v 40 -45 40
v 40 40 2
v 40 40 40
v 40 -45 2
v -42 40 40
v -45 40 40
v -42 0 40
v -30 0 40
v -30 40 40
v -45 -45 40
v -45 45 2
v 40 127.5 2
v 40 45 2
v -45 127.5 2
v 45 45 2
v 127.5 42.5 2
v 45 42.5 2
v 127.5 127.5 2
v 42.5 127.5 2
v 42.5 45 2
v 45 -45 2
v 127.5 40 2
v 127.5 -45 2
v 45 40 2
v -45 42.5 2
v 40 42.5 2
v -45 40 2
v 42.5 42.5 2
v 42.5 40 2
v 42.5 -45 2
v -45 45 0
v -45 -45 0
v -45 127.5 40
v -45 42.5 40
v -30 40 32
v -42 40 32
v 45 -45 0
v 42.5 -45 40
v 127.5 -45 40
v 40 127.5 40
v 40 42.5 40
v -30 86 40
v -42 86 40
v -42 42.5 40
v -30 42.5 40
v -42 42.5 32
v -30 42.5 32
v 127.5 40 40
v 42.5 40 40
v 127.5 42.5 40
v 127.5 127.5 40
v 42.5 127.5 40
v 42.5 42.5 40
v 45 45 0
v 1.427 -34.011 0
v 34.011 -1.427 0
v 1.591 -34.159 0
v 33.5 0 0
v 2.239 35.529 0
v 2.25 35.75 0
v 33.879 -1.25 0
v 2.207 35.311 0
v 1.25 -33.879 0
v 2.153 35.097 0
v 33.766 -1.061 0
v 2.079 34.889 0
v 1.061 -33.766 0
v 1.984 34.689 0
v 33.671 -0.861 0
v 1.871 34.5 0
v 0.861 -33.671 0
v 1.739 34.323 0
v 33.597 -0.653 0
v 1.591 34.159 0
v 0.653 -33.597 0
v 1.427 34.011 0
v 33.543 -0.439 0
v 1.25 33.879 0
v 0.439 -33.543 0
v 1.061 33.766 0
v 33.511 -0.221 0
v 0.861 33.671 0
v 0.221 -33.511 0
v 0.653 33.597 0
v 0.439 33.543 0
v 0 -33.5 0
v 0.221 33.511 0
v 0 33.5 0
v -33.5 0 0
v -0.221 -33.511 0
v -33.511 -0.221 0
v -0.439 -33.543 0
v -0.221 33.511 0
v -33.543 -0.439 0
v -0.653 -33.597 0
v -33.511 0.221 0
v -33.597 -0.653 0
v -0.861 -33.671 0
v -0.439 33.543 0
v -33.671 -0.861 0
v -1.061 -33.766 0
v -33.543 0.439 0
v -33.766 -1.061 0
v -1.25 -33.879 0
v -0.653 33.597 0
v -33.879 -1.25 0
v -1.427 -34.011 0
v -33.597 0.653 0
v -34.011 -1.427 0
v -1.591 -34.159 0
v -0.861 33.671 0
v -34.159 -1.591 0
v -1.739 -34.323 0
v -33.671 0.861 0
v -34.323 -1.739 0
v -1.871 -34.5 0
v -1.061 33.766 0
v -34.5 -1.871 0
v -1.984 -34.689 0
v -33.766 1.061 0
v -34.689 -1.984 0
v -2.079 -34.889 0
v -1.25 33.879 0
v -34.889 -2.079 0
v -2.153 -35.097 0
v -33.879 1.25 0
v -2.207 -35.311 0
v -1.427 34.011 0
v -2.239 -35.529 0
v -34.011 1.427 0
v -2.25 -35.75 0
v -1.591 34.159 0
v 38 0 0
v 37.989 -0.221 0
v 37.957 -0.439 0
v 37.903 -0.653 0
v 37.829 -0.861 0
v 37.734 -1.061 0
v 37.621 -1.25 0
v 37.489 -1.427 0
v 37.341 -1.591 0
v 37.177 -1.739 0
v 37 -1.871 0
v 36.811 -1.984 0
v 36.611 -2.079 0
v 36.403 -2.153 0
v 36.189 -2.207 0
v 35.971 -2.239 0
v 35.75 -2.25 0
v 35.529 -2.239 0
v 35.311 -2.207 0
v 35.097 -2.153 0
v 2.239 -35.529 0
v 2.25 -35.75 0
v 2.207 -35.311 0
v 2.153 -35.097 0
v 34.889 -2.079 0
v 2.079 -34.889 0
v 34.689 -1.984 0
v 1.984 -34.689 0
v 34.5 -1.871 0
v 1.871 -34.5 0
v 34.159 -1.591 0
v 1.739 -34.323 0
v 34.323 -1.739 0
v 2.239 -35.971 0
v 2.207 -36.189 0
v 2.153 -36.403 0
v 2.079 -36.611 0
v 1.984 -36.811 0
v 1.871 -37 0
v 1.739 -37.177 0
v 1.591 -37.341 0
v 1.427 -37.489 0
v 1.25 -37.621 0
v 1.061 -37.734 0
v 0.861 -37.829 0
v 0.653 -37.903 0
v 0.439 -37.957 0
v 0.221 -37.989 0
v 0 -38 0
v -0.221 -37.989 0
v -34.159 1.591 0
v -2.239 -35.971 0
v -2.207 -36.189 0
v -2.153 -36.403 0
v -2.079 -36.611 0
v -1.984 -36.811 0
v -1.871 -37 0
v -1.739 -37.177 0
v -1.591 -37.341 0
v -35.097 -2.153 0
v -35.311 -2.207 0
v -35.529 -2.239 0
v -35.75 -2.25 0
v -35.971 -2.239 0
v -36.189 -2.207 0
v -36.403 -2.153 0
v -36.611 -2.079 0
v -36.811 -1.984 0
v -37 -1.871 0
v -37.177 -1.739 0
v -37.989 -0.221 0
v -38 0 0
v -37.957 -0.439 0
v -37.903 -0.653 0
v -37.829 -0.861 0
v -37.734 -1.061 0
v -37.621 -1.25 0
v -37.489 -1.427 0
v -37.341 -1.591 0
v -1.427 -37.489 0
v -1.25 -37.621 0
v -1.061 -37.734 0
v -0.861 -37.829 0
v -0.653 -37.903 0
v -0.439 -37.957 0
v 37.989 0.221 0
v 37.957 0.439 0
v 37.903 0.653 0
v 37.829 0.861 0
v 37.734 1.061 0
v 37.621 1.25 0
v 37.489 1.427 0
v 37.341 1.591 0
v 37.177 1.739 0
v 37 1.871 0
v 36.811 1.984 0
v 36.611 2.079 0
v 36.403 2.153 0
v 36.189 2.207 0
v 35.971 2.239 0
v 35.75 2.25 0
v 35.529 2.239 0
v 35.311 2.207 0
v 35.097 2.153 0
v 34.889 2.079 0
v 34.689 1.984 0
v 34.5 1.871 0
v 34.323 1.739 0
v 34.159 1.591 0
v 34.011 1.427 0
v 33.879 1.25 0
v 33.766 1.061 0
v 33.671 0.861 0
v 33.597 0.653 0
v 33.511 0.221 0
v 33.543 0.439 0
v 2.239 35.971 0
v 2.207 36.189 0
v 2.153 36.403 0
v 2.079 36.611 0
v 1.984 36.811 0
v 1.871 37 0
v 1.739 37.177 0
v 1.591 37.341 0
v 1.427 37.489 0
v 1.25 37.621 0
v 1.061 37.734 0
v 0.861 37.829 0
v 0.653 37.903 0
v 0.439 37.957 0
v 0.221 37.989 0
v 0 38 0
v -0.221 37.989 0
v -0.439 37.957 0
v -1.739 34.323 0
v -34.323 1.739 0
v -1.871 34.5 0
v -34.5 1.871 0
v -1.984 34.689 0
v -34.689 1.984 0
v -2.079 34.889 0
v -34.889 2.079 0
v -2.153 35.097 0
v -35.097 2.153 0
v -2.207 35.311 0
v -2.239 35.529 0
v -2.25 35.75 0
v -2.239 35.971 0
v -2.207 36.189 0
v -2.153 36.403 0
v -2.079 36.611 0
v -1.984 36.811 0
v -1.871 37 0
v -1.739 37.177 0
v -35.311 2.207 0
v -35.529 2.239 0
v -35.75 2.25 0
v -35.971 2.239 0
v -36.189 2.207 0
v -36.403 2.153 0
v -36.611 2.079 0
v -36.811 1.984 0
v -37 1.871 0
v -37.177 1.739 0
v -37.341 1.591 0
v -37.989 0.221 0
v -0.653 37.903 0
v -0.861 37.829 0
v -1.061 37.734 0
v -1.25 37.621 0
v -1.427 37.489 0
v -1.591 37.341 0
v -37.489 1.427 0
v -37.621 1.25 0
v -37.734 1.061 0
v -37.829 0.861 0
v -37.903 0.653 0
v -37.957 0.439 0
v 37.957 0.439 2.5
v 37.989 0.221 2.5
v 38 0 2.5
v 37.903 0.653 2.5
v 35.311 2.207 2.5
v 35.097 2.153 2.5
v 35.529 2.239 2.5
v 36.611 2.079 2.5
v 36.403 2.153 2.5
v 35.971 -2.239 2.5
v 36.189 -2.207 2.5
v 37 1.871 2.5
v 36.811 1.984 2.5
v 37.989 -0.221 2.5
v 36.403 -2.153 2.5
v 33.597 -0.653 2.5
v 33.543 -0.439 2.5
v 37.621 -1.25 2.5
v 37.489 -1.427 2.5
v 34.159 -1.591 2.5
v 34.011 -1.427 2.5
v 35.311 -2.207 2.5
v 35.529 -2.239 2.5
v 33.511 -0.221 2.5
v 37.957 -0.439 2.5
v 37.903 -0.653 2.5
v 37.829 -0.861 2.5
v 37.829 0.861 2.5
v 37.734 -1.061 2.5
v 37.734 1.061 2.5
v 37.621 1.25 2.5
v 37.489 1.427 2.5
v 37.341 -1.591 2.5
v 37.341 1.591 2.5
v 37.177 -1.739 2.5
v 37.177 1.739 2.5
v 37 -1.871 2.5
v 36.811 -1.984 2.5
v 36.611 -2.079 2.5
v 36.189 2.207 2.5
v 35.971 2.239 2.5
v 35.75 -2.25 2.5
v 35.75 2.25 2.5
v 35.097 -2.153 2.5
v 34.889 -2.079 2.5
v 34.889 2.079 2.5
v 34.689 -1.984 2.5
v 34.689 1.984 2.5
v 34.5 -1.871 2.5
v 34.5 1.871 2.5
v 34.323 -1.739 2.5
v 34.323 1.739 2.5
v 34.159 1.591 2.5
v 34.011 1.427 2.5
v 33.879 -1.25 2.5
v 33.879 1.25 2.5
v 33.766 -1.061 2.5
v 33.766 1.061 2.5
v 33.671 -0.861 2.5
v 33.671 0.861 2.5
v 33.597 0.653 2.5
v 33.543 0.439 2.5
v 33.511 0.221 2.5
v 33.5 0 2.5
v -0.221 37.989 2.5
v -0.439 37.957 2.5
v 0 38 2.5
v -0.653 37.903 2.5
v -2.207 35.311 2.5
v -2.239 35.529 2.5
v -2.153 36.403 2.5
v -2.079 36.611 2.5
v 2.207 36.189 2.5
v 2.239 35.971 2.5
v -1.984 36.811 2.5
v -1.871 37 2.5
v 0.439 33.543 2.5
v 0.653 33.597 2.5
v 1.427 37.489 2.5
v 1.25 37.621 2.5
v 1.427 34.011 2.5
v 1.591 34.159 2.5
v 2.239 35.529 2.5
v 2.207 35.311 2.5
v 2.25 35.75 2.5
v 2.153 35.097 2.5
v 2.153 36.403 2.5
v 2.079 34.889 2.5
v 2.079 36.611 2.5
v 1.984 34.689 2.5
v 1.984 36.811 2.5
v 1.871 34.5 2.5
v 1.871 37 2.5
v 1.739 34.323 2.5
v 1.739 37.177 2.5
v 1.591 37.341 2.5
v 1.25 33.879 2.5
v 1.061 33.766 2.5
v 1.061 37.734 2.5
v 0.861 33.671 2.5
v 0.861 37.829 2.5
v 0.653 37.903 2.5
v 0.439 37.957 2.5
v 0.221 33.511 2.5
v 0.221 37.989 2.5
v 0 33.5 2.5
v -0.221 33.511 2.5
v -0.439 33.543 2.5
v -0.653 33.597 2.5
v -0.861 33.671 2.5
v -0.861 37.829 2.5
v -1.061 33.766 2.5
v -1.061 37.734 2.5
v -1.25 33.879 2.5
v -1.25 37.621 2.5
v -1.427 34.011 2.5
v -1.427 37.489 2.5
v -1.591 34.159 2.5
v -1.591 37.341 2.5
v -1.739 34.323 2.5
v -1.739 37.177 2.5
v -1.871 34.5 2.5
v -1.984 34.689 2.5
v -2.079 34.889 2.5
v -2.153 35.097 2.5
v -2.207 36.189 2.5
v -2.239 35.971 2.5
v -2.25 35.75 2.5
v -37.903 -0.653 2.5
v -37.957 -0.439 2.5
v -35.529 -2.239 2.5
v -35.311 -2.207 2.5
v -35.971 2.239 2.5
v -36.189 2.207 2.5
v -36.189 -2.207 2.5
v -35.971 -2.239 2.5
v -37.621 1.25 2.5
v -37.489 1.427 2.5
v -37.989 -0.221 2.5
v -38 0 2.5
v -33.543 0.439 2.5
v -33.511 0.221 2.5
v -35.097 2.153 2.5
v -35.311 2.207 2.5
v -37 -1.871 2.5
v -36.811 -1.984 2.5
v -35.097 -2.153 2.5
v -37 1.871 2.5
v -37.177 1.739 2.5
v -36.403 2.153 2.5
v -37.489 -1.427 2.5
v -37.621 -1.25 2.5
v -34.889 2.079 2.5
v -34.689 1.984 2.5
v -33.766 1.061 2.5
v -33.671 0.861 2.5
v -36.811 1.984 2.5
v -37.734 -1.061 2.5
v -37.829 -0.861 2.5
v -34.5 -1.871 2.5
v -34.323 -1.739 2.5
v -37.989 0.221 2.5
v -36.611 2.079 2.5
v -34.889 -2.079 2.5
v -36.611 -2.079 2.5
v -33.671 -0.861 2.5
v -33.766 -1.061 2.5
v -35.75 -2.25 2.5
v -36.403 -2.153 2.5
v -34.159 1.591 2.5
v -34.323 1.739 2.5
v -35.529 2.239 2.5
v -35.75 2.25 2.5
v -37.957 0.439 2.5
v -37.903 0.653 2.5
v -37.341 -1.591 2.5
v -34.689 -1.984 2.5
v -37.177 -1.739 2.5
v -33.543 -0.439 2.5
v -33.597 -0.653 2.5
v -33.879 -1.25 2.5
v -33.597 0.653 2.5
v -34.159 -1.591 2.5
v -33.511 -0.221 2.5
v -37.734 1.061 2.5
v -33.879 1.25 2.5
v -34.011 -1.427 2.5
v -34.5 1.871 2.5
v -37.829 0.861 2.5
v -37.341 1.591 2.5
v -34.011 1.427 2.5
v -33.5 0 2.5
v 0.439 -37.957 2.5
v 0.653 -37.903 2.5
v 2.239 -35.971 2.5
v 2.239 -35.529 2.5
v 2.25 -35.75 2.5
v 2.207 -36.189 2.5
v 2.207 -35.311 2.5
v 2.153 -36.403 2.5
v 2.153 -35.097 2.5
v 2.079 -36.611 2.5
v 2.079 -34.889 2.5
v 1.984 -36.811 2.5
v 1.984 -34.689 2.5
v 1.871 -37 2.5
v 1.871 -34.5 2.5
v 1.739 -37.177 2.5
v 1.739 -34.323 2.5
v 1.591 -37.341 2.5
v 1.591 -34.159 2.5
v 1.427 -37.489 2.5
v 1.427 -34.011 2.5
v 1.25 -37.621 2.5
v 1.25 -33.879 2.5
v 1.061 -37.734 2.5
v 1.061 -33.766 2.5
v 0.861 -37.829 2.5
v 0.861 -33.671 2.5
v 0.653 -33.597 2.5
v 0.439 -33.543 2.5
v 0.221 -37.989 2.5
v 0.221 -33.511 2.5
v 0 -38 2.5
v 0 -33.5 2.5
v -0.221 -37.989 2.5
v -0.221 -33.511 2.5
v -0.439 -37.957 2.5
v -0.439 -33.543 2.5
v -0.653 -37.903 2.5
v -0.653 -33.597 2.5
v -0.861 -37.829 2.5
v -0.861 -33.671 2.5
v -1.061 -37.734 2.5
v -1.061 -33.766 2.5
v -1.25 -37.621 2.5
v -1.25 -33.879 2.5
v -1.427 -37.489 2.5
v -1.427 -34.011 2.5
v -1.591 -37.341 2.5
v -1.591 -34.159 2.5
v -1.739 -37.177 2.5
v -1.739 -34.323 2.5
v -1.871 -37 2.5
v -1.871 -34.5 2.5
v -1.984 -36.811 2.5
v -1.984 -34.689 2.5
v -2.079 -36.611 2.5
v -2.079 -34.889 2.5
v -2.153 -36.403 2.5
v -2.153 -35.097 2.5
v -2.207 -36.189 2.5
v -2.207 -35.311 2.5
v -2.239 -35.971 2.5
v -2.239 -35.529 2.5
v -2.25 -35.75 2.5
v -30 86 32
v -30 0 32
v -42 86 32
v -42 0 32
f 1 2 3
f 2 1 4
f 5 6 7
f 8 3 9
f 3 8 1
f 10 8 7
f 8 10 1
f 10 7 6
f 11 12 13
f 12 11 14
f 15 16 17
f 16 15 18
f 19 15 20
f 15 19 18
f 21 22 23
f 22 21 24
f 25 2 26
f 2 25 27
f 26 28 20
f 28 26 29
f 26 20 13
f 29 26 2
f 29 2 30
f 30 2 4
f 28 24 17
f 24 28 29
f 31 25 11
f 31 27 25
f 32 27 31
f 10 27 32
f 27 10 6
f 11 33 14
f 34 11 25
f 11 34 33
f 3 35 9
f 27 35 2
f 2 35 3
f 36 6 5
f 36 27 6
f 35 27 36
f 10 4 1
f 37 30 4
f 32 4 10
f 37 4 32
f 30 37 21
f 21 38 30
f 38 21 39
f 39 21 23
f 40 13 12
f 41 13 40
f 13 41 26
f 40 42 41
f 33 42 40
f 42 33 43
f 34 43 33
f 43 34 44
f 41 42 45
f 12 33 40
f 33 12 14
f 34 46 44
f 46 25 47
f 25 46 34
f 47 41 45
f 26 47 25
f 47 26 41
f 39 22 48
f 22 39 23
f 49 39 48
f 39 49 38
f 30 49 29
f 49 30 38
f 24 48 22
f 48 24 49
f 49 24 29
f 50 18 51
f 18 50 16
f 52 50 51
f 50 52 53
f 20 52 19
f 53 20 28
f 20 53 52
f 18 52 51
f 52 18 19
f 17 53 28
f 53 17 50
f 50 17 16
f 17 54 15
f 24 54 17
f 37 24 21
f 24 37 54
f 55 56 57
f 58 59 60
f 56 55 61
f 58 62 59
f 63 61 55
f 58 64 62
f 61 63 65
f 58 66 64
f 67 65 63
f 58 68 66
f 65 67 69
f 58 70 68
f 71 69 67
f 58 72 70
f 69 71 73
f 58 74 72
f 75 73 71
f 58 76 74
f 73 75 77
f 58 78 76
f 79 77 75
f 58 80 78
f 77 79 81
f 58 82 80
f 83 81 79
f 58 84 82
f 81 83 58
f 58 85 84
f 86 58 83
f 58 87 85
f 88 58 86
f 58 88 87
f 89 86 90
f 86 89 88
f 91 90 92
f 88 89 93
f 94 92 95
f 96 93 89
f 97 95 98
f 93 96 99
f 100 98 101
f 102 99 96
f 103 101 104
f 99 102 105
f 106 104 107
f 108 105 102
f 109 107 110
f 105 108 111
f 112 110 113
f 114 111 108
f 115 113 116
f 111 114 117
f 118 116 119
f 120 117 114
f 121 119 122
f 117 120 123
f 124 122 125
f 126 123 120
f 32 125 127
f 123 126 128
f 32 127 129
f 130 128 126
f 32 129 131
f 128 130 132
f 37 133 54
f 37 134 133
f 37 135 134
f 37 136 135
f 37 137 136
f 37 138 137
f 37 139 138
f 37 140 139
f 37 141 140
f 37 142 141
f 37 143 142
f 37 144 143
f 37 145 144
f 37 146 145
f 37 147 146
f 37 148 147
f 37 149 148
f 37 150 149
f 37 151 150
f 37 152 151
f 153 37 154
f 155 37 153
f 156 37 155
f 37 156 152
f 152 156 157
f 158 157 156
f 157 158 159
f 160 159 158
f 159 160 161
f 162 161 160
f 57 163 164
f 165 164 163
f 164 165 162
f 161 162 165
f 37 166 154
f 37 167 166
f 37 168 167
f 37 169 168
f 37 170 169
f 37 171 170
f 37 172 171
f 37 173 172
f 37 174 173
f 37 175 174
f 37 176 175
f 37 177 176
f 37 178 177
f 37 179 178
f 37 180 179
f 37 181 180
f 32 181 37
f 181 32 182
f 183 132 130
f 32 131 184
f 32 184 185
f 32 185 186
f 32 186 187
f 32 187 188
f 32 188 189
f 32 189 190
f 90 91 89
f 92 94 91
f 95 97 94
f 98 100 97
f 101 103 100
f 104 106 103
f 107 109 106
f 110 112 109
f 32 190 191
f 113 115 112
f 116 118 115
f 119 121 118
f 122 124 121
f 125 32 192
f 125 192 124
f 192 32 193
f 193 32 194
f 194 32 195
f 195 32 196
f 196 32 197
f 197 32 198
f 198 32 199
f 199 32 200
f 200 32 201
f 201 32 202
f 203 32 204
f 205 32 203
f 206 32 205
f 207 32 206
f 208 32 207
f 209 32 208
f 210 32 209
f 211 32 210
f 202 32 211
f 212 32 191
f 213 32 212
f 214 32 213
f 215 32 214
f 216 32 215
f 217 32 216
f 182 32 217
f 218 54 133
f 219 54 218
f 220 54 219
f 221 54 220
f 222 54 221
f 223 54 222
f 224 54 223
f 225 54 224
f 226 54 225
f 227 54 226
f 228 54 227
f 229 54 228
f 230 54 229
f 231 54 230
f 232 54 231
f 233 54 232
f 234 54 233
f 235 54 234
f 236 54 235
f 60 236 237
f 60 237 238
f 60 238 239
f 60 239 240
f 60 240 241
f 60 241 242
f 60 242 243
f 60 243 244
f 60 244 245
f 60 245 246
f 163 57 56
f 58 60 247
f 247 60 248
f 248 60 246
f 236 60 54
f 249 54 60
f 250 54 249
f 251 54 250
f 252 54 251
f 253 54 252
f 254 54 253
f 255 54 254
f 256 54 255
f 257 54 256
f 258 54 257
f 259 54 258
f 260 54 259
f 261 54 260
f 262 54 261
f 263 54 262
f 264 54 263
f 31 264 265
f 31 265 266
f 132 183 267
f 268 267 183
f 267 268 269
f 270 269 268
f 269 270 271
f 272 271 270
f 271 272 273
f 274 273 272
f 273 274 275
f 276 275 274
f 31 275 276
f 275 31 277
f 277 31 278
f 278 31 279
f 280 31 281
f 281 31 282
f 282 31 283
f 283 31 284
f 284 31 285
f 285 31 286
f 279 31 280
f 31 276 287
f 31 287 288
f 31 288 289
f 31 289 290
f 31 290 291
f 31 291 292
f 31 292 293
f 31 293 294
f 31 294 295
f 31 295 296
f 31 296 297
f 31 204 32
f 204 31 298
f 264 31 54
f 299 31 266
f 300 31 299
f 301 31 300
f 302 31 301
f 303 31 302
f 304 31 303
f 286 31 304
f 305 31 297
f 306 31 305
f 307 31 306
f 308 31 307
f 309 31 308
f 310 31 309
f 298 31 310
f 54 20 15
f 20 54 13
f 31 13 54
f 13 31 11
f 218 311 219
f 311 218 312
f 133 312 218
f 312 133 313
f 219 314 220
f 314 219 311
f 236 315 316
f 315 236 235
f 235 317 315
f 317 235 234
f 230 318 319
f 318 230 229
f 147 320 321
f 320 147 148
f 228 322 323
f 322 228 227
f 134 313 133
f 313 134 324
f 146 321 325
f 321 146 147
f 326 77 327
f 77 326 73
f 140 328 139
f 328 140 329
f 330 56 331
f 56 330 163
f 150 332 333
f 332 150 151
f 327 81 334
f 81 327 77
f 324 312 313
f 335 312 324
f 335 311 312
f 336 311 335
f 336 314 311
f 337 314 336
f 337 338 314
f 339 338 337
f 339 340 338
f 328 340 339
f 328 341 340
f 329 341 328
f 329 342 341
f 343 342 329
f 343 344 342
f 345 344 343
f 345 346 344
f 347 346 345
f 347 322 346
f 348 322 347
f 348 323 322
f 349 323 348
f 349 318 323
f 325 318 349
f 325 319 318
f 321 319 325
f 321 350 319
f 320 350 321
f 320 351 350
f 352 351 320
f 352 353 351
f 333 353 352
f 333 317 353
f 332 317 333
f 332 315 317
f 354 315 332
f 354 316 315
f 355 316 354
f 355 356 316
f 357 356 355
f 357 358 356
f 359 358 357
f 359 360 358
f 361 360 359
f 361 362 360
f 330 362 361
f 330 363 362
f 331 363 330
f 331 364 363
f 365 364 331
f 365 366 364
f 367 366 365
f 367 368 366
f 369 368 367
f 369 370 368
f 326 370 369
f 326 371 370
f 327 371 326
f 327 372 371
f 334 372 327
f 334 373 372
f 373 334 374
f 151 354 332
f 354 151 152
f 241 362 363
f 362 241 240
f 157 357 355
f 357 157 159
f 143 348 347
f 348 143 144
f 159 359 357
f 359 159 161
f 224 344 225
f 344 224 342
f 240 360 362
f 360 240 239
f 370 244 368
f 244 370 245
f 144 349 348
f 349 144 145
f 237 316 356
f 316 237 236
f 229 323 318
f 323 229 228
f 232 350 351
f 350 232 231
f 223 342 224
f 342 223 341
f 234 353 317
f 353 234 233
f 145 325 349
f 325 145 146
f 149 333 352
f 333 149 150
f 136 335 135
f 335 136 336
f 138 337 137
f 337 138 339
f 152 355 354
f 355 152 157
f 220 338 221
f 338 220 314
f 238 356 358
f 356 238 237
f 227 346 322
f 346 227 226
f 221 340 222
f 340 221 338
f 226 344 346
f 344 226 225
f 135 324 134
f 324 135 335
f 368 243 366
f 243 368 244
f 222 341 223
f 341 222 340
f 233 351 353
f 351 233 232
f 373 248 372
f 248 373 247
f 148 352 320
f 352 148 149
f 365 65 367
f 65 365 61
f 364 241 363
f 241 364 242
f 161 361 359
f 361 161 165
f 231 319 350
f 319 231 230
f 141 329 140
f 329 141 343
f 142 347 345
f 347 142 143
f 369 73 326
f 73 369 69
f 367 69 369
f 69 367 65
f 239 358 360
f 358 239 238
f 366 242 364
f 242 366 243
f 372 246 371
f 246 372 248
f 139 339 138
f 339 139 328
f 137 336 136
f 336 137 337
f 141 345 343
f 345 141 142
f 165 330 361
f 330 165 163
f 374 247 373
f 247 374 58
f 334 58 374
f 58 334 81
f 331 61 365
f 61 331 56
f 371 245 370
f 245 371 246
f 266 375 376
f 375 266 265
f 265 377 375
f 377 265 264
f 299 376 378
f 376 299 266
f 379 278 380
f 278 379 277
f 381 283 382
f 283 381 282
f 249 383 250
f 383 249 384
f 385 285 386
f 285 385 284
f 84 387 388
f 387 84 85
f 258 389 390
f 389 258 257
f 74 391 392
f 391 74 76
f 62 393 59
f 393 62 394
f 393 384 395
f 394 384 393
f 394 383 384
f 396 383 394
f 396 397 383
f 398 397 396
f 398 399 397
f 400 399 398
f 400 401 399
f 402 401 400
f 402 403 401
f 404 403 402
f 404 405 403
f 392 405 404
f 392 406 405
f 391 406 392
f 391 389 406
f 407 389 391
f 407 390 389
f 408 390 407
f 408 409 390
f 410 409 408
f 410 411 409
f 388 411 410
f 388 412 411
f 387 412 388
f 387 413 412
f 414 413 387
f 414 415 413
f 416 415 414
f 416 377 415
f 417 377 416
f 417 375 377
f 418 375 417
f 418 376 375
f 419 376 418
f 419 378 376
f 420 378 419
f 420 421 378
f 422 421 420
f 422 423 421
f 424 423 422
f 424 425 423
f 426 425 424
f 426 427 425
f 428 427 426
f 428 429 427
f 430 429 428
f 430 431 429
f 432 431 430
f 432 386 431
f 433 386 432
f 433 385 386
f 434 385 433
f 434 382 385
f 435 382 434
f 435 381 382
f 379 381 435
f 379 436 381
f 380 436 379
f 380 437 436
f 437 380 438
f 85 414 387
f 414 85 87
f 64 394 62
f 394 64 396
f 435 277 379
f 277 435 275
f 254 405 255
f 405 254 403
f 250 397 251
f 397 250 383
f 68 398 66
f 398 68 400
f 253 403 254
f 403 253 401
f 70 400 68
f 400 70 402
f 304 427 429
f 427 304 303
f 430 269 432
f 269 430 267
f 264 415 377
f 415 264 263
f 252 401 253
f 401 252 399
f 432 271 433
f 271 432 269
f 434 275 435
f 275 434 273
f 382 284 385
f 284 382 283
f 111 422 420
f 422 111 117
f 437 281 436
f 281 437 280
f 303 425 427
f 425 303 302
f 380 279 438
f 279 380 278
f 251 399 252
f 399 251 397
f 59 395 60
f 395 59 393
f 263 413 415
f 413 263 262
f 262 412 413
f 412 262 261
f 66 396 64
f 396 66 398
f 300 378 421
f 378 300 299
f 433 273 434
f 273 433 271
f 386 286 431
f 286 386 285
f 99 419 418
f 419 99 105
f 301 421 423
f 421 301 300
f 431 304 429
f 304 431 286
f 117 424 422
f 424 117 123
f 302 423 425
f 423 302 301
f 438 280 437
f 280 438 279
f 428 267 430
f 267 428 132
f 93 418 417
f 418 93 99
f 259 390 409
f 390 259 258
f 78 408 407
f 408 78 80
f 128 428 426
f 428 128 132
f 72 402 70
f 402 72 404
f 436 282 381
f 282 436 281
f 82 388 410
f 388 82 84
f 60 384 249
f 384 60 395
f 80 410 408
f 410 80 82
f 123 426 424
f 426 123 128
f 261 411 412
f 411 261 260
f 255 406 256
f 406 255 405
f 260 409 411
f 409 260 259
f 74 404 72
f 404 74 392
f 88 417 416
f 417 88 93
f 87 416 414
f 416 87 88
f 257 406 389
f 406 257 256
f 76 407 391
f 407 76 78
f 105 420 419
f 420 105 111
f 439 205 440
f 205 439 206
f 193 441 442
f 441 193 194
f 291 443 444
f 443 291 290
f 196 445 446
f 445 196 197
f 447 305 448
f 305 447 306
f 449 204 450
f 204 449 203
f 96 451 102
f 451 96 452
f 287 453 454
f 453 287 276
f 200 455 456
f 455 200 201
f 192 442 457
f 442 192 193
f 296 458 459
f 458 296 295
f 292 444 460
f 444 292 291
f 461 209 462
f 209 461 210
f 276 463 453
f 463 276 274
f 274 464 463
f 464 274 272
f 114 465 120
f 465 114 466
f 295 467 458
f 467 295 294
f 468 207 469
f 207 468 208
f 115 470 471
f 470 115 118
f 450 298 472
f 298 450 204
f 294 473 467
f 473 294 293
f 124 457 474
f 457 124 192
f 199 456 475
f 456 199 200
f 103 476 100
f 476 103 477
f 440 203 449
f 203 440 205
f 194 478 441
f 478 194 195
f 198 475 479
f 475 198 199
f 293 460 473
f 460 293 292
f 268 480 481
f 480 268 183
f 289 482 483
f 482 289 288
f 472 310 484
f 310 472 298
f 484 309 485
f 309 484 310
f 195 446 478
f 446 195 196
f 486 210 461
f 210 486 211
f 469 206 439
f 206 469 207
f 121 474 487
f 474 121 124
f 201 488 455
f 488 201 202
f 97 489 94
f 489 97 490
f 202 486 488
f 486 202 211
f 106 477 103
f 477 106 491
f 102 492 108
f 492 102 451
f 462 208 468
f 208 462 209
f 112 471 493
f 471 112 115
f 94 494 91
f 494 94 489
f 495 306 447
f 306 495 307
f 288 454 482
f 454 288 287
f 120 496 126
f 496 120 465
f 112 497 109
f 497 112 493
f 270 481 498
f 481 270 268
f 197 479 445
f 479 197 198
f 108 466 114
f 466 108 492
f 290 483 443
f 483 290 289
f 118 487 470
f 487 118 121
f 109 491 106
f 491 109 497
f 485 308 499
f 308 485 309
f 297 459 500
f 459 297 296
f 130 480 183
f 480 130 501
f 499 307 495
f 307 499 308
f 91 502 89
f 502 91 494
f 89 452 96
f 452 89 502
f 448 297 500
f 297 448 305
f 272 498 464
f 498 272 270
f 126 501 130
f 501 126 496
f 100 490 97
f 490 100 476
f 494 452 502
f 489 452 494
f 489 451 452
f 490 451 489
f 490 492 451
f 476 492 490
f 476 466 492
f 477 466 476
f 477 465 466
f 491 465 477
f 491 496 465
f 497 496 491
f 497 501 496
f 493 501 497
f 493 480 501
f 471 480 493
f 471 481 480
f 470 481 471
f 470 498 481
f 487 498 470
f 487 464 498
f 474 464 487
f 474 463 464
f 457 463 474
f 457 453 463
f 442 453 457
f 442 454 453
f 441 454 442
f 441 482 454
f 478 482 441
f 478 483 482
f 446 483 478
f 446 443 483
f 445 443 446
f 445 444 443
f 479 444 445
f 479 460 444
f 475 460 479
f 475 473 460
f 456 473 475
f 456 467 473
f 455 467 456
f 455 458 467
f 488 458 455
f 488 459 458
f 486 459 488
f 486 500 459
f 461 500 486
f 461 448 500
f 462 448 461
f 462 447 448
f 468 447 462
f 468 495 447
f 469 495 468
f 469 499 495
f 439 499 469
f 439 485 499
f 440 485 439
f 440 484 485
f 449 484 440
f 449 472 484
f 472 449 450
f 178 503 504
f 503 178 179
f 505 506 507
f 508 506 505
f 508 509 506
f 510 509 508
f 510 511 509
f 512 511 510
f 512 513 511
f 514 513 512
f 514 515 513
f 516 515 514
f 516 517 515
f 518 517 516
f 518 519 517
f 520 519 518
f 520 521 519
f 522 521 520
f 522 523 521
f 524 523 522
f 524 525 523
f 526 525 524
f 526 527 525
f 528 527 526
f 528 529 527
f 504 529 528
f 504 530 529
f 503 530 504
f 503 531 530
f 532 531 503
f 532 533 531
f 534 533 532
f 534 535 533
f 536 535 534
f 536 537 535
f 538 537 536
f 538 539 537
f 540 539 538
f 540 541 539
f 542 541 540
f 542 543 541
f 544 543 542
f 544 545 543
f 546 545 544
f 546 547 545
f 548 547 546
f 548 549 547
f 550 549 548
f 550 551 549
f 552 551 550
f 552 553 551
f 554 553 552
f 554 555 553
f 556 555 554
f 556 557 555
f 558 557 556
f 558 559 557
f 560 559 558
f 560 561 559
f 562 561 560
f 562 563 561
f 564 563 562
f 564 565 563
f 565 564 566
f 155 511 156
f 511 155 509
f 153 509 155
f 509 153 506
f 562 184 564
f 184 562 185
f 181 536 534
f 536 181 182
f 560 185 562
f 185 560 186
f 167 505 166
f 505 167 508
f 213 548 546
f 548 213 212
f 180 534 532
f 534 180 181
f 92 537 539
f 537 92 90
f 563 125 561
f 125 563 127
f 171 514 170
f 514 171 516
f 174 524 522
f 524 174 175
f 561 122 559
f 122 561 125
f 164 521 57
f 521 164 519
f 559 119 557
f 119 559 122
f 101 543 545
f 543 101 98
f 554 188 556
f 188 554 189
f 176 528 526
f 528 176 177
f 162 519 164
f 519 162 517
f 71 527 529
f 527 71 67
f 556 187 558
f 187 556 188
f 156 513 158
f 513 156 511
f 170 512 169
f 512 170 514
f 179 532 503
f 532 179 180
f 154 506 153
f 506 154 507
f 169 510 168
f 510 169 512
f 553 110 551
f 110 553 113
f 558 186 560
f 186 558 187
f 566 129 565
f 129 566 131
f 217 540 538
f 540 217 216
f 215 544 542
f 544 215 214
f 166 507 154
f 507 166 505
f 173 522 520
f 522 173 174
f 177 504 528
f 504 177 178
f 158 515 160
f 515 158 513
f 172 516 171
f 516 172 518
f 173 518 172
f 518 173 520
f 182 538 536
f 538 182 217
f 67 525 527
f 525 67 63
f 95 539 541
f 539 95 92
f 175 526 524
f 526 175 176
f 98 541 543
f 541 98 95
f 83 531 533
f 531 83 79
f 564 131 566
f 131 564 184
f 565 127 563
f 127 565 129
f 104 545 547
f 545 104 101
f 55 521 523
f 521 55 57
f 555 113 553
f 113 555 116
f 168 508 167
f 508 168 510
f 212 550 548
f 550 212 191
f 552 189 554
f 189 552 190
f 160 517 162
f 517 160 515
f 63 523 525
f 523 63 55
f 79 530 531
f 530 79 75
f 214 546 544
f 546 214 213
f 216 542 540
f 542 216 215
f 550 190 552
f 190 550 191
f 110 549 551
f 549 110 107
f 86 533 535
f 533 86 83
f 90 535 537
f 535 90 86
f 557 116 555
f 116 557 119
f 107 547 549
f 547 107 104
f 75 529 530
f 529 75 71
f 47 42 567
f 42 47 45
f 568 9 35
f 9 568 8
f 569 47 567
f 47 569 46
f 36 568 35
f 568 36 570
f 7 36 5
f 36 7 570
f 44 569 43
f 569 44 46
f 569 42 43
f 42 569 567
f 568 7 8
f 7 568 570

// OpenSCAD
// DIY magnetic stirrer housing for an 80 mm PC case fan
// Print orientation: upside-down open box, top plate on the bed

// ---------- Dimensions (mm) ----------
box_top     = 90;    // outer size in X and Y
box_height  = 40;    // wall height (z = 0 to 40)
plate       = 2;     // top plate thickness
wall        = 2.5;   // wall thickness
screw       = 4.5;   // M4 screw hole diameter
screw_pitch = 71.5;  // square pattern diagonal for 4 screw holes
notch_w     = 12;    // power cable notch width
notch_depth = 8;     // notch depth from open edge (z = 32 to 40)
eps         = 0.5;   // overcut for clean differences

$fn = 64;

// ---------- Model ----------
difference() {
    union() {
        // Top plate, centred in XY, lying on z = 0
        translate([-box_top/2, -box_top/2, 0])
            cube([box_top, box_top, plate]);

        // Four walls rising from the plate to z = box_height
        for (sx = [-1, 1], sy = [-1, 1]) {
            translate([sx > 0 ? box_top/2 - wall : -box_top/2,
                       sy > 0 ? box_top/2 - wall : -box_top/2,
                       plate])
                cube([box_top - 2*wall, box_top - 2*wall, box_height - plate]);
        }
    }

    // Four M4 screw holes through the top plate on a square pattern
    for (i = [0:3]) {
        rotate([0, 0, i * 90])
            translate([screw_pitch/2, 0, -eps])
                cylinder(d = screw, h = plate + 2*eps);
    }

    // Notch for the power cable in one wall (centred along the wall)
    translate([-box_top/2 + wall + eps, 0, box_height - notch_depth])
        cube([notch_w, box_top - 2*wall + 2*eps, notch_depth + eps]);
}
